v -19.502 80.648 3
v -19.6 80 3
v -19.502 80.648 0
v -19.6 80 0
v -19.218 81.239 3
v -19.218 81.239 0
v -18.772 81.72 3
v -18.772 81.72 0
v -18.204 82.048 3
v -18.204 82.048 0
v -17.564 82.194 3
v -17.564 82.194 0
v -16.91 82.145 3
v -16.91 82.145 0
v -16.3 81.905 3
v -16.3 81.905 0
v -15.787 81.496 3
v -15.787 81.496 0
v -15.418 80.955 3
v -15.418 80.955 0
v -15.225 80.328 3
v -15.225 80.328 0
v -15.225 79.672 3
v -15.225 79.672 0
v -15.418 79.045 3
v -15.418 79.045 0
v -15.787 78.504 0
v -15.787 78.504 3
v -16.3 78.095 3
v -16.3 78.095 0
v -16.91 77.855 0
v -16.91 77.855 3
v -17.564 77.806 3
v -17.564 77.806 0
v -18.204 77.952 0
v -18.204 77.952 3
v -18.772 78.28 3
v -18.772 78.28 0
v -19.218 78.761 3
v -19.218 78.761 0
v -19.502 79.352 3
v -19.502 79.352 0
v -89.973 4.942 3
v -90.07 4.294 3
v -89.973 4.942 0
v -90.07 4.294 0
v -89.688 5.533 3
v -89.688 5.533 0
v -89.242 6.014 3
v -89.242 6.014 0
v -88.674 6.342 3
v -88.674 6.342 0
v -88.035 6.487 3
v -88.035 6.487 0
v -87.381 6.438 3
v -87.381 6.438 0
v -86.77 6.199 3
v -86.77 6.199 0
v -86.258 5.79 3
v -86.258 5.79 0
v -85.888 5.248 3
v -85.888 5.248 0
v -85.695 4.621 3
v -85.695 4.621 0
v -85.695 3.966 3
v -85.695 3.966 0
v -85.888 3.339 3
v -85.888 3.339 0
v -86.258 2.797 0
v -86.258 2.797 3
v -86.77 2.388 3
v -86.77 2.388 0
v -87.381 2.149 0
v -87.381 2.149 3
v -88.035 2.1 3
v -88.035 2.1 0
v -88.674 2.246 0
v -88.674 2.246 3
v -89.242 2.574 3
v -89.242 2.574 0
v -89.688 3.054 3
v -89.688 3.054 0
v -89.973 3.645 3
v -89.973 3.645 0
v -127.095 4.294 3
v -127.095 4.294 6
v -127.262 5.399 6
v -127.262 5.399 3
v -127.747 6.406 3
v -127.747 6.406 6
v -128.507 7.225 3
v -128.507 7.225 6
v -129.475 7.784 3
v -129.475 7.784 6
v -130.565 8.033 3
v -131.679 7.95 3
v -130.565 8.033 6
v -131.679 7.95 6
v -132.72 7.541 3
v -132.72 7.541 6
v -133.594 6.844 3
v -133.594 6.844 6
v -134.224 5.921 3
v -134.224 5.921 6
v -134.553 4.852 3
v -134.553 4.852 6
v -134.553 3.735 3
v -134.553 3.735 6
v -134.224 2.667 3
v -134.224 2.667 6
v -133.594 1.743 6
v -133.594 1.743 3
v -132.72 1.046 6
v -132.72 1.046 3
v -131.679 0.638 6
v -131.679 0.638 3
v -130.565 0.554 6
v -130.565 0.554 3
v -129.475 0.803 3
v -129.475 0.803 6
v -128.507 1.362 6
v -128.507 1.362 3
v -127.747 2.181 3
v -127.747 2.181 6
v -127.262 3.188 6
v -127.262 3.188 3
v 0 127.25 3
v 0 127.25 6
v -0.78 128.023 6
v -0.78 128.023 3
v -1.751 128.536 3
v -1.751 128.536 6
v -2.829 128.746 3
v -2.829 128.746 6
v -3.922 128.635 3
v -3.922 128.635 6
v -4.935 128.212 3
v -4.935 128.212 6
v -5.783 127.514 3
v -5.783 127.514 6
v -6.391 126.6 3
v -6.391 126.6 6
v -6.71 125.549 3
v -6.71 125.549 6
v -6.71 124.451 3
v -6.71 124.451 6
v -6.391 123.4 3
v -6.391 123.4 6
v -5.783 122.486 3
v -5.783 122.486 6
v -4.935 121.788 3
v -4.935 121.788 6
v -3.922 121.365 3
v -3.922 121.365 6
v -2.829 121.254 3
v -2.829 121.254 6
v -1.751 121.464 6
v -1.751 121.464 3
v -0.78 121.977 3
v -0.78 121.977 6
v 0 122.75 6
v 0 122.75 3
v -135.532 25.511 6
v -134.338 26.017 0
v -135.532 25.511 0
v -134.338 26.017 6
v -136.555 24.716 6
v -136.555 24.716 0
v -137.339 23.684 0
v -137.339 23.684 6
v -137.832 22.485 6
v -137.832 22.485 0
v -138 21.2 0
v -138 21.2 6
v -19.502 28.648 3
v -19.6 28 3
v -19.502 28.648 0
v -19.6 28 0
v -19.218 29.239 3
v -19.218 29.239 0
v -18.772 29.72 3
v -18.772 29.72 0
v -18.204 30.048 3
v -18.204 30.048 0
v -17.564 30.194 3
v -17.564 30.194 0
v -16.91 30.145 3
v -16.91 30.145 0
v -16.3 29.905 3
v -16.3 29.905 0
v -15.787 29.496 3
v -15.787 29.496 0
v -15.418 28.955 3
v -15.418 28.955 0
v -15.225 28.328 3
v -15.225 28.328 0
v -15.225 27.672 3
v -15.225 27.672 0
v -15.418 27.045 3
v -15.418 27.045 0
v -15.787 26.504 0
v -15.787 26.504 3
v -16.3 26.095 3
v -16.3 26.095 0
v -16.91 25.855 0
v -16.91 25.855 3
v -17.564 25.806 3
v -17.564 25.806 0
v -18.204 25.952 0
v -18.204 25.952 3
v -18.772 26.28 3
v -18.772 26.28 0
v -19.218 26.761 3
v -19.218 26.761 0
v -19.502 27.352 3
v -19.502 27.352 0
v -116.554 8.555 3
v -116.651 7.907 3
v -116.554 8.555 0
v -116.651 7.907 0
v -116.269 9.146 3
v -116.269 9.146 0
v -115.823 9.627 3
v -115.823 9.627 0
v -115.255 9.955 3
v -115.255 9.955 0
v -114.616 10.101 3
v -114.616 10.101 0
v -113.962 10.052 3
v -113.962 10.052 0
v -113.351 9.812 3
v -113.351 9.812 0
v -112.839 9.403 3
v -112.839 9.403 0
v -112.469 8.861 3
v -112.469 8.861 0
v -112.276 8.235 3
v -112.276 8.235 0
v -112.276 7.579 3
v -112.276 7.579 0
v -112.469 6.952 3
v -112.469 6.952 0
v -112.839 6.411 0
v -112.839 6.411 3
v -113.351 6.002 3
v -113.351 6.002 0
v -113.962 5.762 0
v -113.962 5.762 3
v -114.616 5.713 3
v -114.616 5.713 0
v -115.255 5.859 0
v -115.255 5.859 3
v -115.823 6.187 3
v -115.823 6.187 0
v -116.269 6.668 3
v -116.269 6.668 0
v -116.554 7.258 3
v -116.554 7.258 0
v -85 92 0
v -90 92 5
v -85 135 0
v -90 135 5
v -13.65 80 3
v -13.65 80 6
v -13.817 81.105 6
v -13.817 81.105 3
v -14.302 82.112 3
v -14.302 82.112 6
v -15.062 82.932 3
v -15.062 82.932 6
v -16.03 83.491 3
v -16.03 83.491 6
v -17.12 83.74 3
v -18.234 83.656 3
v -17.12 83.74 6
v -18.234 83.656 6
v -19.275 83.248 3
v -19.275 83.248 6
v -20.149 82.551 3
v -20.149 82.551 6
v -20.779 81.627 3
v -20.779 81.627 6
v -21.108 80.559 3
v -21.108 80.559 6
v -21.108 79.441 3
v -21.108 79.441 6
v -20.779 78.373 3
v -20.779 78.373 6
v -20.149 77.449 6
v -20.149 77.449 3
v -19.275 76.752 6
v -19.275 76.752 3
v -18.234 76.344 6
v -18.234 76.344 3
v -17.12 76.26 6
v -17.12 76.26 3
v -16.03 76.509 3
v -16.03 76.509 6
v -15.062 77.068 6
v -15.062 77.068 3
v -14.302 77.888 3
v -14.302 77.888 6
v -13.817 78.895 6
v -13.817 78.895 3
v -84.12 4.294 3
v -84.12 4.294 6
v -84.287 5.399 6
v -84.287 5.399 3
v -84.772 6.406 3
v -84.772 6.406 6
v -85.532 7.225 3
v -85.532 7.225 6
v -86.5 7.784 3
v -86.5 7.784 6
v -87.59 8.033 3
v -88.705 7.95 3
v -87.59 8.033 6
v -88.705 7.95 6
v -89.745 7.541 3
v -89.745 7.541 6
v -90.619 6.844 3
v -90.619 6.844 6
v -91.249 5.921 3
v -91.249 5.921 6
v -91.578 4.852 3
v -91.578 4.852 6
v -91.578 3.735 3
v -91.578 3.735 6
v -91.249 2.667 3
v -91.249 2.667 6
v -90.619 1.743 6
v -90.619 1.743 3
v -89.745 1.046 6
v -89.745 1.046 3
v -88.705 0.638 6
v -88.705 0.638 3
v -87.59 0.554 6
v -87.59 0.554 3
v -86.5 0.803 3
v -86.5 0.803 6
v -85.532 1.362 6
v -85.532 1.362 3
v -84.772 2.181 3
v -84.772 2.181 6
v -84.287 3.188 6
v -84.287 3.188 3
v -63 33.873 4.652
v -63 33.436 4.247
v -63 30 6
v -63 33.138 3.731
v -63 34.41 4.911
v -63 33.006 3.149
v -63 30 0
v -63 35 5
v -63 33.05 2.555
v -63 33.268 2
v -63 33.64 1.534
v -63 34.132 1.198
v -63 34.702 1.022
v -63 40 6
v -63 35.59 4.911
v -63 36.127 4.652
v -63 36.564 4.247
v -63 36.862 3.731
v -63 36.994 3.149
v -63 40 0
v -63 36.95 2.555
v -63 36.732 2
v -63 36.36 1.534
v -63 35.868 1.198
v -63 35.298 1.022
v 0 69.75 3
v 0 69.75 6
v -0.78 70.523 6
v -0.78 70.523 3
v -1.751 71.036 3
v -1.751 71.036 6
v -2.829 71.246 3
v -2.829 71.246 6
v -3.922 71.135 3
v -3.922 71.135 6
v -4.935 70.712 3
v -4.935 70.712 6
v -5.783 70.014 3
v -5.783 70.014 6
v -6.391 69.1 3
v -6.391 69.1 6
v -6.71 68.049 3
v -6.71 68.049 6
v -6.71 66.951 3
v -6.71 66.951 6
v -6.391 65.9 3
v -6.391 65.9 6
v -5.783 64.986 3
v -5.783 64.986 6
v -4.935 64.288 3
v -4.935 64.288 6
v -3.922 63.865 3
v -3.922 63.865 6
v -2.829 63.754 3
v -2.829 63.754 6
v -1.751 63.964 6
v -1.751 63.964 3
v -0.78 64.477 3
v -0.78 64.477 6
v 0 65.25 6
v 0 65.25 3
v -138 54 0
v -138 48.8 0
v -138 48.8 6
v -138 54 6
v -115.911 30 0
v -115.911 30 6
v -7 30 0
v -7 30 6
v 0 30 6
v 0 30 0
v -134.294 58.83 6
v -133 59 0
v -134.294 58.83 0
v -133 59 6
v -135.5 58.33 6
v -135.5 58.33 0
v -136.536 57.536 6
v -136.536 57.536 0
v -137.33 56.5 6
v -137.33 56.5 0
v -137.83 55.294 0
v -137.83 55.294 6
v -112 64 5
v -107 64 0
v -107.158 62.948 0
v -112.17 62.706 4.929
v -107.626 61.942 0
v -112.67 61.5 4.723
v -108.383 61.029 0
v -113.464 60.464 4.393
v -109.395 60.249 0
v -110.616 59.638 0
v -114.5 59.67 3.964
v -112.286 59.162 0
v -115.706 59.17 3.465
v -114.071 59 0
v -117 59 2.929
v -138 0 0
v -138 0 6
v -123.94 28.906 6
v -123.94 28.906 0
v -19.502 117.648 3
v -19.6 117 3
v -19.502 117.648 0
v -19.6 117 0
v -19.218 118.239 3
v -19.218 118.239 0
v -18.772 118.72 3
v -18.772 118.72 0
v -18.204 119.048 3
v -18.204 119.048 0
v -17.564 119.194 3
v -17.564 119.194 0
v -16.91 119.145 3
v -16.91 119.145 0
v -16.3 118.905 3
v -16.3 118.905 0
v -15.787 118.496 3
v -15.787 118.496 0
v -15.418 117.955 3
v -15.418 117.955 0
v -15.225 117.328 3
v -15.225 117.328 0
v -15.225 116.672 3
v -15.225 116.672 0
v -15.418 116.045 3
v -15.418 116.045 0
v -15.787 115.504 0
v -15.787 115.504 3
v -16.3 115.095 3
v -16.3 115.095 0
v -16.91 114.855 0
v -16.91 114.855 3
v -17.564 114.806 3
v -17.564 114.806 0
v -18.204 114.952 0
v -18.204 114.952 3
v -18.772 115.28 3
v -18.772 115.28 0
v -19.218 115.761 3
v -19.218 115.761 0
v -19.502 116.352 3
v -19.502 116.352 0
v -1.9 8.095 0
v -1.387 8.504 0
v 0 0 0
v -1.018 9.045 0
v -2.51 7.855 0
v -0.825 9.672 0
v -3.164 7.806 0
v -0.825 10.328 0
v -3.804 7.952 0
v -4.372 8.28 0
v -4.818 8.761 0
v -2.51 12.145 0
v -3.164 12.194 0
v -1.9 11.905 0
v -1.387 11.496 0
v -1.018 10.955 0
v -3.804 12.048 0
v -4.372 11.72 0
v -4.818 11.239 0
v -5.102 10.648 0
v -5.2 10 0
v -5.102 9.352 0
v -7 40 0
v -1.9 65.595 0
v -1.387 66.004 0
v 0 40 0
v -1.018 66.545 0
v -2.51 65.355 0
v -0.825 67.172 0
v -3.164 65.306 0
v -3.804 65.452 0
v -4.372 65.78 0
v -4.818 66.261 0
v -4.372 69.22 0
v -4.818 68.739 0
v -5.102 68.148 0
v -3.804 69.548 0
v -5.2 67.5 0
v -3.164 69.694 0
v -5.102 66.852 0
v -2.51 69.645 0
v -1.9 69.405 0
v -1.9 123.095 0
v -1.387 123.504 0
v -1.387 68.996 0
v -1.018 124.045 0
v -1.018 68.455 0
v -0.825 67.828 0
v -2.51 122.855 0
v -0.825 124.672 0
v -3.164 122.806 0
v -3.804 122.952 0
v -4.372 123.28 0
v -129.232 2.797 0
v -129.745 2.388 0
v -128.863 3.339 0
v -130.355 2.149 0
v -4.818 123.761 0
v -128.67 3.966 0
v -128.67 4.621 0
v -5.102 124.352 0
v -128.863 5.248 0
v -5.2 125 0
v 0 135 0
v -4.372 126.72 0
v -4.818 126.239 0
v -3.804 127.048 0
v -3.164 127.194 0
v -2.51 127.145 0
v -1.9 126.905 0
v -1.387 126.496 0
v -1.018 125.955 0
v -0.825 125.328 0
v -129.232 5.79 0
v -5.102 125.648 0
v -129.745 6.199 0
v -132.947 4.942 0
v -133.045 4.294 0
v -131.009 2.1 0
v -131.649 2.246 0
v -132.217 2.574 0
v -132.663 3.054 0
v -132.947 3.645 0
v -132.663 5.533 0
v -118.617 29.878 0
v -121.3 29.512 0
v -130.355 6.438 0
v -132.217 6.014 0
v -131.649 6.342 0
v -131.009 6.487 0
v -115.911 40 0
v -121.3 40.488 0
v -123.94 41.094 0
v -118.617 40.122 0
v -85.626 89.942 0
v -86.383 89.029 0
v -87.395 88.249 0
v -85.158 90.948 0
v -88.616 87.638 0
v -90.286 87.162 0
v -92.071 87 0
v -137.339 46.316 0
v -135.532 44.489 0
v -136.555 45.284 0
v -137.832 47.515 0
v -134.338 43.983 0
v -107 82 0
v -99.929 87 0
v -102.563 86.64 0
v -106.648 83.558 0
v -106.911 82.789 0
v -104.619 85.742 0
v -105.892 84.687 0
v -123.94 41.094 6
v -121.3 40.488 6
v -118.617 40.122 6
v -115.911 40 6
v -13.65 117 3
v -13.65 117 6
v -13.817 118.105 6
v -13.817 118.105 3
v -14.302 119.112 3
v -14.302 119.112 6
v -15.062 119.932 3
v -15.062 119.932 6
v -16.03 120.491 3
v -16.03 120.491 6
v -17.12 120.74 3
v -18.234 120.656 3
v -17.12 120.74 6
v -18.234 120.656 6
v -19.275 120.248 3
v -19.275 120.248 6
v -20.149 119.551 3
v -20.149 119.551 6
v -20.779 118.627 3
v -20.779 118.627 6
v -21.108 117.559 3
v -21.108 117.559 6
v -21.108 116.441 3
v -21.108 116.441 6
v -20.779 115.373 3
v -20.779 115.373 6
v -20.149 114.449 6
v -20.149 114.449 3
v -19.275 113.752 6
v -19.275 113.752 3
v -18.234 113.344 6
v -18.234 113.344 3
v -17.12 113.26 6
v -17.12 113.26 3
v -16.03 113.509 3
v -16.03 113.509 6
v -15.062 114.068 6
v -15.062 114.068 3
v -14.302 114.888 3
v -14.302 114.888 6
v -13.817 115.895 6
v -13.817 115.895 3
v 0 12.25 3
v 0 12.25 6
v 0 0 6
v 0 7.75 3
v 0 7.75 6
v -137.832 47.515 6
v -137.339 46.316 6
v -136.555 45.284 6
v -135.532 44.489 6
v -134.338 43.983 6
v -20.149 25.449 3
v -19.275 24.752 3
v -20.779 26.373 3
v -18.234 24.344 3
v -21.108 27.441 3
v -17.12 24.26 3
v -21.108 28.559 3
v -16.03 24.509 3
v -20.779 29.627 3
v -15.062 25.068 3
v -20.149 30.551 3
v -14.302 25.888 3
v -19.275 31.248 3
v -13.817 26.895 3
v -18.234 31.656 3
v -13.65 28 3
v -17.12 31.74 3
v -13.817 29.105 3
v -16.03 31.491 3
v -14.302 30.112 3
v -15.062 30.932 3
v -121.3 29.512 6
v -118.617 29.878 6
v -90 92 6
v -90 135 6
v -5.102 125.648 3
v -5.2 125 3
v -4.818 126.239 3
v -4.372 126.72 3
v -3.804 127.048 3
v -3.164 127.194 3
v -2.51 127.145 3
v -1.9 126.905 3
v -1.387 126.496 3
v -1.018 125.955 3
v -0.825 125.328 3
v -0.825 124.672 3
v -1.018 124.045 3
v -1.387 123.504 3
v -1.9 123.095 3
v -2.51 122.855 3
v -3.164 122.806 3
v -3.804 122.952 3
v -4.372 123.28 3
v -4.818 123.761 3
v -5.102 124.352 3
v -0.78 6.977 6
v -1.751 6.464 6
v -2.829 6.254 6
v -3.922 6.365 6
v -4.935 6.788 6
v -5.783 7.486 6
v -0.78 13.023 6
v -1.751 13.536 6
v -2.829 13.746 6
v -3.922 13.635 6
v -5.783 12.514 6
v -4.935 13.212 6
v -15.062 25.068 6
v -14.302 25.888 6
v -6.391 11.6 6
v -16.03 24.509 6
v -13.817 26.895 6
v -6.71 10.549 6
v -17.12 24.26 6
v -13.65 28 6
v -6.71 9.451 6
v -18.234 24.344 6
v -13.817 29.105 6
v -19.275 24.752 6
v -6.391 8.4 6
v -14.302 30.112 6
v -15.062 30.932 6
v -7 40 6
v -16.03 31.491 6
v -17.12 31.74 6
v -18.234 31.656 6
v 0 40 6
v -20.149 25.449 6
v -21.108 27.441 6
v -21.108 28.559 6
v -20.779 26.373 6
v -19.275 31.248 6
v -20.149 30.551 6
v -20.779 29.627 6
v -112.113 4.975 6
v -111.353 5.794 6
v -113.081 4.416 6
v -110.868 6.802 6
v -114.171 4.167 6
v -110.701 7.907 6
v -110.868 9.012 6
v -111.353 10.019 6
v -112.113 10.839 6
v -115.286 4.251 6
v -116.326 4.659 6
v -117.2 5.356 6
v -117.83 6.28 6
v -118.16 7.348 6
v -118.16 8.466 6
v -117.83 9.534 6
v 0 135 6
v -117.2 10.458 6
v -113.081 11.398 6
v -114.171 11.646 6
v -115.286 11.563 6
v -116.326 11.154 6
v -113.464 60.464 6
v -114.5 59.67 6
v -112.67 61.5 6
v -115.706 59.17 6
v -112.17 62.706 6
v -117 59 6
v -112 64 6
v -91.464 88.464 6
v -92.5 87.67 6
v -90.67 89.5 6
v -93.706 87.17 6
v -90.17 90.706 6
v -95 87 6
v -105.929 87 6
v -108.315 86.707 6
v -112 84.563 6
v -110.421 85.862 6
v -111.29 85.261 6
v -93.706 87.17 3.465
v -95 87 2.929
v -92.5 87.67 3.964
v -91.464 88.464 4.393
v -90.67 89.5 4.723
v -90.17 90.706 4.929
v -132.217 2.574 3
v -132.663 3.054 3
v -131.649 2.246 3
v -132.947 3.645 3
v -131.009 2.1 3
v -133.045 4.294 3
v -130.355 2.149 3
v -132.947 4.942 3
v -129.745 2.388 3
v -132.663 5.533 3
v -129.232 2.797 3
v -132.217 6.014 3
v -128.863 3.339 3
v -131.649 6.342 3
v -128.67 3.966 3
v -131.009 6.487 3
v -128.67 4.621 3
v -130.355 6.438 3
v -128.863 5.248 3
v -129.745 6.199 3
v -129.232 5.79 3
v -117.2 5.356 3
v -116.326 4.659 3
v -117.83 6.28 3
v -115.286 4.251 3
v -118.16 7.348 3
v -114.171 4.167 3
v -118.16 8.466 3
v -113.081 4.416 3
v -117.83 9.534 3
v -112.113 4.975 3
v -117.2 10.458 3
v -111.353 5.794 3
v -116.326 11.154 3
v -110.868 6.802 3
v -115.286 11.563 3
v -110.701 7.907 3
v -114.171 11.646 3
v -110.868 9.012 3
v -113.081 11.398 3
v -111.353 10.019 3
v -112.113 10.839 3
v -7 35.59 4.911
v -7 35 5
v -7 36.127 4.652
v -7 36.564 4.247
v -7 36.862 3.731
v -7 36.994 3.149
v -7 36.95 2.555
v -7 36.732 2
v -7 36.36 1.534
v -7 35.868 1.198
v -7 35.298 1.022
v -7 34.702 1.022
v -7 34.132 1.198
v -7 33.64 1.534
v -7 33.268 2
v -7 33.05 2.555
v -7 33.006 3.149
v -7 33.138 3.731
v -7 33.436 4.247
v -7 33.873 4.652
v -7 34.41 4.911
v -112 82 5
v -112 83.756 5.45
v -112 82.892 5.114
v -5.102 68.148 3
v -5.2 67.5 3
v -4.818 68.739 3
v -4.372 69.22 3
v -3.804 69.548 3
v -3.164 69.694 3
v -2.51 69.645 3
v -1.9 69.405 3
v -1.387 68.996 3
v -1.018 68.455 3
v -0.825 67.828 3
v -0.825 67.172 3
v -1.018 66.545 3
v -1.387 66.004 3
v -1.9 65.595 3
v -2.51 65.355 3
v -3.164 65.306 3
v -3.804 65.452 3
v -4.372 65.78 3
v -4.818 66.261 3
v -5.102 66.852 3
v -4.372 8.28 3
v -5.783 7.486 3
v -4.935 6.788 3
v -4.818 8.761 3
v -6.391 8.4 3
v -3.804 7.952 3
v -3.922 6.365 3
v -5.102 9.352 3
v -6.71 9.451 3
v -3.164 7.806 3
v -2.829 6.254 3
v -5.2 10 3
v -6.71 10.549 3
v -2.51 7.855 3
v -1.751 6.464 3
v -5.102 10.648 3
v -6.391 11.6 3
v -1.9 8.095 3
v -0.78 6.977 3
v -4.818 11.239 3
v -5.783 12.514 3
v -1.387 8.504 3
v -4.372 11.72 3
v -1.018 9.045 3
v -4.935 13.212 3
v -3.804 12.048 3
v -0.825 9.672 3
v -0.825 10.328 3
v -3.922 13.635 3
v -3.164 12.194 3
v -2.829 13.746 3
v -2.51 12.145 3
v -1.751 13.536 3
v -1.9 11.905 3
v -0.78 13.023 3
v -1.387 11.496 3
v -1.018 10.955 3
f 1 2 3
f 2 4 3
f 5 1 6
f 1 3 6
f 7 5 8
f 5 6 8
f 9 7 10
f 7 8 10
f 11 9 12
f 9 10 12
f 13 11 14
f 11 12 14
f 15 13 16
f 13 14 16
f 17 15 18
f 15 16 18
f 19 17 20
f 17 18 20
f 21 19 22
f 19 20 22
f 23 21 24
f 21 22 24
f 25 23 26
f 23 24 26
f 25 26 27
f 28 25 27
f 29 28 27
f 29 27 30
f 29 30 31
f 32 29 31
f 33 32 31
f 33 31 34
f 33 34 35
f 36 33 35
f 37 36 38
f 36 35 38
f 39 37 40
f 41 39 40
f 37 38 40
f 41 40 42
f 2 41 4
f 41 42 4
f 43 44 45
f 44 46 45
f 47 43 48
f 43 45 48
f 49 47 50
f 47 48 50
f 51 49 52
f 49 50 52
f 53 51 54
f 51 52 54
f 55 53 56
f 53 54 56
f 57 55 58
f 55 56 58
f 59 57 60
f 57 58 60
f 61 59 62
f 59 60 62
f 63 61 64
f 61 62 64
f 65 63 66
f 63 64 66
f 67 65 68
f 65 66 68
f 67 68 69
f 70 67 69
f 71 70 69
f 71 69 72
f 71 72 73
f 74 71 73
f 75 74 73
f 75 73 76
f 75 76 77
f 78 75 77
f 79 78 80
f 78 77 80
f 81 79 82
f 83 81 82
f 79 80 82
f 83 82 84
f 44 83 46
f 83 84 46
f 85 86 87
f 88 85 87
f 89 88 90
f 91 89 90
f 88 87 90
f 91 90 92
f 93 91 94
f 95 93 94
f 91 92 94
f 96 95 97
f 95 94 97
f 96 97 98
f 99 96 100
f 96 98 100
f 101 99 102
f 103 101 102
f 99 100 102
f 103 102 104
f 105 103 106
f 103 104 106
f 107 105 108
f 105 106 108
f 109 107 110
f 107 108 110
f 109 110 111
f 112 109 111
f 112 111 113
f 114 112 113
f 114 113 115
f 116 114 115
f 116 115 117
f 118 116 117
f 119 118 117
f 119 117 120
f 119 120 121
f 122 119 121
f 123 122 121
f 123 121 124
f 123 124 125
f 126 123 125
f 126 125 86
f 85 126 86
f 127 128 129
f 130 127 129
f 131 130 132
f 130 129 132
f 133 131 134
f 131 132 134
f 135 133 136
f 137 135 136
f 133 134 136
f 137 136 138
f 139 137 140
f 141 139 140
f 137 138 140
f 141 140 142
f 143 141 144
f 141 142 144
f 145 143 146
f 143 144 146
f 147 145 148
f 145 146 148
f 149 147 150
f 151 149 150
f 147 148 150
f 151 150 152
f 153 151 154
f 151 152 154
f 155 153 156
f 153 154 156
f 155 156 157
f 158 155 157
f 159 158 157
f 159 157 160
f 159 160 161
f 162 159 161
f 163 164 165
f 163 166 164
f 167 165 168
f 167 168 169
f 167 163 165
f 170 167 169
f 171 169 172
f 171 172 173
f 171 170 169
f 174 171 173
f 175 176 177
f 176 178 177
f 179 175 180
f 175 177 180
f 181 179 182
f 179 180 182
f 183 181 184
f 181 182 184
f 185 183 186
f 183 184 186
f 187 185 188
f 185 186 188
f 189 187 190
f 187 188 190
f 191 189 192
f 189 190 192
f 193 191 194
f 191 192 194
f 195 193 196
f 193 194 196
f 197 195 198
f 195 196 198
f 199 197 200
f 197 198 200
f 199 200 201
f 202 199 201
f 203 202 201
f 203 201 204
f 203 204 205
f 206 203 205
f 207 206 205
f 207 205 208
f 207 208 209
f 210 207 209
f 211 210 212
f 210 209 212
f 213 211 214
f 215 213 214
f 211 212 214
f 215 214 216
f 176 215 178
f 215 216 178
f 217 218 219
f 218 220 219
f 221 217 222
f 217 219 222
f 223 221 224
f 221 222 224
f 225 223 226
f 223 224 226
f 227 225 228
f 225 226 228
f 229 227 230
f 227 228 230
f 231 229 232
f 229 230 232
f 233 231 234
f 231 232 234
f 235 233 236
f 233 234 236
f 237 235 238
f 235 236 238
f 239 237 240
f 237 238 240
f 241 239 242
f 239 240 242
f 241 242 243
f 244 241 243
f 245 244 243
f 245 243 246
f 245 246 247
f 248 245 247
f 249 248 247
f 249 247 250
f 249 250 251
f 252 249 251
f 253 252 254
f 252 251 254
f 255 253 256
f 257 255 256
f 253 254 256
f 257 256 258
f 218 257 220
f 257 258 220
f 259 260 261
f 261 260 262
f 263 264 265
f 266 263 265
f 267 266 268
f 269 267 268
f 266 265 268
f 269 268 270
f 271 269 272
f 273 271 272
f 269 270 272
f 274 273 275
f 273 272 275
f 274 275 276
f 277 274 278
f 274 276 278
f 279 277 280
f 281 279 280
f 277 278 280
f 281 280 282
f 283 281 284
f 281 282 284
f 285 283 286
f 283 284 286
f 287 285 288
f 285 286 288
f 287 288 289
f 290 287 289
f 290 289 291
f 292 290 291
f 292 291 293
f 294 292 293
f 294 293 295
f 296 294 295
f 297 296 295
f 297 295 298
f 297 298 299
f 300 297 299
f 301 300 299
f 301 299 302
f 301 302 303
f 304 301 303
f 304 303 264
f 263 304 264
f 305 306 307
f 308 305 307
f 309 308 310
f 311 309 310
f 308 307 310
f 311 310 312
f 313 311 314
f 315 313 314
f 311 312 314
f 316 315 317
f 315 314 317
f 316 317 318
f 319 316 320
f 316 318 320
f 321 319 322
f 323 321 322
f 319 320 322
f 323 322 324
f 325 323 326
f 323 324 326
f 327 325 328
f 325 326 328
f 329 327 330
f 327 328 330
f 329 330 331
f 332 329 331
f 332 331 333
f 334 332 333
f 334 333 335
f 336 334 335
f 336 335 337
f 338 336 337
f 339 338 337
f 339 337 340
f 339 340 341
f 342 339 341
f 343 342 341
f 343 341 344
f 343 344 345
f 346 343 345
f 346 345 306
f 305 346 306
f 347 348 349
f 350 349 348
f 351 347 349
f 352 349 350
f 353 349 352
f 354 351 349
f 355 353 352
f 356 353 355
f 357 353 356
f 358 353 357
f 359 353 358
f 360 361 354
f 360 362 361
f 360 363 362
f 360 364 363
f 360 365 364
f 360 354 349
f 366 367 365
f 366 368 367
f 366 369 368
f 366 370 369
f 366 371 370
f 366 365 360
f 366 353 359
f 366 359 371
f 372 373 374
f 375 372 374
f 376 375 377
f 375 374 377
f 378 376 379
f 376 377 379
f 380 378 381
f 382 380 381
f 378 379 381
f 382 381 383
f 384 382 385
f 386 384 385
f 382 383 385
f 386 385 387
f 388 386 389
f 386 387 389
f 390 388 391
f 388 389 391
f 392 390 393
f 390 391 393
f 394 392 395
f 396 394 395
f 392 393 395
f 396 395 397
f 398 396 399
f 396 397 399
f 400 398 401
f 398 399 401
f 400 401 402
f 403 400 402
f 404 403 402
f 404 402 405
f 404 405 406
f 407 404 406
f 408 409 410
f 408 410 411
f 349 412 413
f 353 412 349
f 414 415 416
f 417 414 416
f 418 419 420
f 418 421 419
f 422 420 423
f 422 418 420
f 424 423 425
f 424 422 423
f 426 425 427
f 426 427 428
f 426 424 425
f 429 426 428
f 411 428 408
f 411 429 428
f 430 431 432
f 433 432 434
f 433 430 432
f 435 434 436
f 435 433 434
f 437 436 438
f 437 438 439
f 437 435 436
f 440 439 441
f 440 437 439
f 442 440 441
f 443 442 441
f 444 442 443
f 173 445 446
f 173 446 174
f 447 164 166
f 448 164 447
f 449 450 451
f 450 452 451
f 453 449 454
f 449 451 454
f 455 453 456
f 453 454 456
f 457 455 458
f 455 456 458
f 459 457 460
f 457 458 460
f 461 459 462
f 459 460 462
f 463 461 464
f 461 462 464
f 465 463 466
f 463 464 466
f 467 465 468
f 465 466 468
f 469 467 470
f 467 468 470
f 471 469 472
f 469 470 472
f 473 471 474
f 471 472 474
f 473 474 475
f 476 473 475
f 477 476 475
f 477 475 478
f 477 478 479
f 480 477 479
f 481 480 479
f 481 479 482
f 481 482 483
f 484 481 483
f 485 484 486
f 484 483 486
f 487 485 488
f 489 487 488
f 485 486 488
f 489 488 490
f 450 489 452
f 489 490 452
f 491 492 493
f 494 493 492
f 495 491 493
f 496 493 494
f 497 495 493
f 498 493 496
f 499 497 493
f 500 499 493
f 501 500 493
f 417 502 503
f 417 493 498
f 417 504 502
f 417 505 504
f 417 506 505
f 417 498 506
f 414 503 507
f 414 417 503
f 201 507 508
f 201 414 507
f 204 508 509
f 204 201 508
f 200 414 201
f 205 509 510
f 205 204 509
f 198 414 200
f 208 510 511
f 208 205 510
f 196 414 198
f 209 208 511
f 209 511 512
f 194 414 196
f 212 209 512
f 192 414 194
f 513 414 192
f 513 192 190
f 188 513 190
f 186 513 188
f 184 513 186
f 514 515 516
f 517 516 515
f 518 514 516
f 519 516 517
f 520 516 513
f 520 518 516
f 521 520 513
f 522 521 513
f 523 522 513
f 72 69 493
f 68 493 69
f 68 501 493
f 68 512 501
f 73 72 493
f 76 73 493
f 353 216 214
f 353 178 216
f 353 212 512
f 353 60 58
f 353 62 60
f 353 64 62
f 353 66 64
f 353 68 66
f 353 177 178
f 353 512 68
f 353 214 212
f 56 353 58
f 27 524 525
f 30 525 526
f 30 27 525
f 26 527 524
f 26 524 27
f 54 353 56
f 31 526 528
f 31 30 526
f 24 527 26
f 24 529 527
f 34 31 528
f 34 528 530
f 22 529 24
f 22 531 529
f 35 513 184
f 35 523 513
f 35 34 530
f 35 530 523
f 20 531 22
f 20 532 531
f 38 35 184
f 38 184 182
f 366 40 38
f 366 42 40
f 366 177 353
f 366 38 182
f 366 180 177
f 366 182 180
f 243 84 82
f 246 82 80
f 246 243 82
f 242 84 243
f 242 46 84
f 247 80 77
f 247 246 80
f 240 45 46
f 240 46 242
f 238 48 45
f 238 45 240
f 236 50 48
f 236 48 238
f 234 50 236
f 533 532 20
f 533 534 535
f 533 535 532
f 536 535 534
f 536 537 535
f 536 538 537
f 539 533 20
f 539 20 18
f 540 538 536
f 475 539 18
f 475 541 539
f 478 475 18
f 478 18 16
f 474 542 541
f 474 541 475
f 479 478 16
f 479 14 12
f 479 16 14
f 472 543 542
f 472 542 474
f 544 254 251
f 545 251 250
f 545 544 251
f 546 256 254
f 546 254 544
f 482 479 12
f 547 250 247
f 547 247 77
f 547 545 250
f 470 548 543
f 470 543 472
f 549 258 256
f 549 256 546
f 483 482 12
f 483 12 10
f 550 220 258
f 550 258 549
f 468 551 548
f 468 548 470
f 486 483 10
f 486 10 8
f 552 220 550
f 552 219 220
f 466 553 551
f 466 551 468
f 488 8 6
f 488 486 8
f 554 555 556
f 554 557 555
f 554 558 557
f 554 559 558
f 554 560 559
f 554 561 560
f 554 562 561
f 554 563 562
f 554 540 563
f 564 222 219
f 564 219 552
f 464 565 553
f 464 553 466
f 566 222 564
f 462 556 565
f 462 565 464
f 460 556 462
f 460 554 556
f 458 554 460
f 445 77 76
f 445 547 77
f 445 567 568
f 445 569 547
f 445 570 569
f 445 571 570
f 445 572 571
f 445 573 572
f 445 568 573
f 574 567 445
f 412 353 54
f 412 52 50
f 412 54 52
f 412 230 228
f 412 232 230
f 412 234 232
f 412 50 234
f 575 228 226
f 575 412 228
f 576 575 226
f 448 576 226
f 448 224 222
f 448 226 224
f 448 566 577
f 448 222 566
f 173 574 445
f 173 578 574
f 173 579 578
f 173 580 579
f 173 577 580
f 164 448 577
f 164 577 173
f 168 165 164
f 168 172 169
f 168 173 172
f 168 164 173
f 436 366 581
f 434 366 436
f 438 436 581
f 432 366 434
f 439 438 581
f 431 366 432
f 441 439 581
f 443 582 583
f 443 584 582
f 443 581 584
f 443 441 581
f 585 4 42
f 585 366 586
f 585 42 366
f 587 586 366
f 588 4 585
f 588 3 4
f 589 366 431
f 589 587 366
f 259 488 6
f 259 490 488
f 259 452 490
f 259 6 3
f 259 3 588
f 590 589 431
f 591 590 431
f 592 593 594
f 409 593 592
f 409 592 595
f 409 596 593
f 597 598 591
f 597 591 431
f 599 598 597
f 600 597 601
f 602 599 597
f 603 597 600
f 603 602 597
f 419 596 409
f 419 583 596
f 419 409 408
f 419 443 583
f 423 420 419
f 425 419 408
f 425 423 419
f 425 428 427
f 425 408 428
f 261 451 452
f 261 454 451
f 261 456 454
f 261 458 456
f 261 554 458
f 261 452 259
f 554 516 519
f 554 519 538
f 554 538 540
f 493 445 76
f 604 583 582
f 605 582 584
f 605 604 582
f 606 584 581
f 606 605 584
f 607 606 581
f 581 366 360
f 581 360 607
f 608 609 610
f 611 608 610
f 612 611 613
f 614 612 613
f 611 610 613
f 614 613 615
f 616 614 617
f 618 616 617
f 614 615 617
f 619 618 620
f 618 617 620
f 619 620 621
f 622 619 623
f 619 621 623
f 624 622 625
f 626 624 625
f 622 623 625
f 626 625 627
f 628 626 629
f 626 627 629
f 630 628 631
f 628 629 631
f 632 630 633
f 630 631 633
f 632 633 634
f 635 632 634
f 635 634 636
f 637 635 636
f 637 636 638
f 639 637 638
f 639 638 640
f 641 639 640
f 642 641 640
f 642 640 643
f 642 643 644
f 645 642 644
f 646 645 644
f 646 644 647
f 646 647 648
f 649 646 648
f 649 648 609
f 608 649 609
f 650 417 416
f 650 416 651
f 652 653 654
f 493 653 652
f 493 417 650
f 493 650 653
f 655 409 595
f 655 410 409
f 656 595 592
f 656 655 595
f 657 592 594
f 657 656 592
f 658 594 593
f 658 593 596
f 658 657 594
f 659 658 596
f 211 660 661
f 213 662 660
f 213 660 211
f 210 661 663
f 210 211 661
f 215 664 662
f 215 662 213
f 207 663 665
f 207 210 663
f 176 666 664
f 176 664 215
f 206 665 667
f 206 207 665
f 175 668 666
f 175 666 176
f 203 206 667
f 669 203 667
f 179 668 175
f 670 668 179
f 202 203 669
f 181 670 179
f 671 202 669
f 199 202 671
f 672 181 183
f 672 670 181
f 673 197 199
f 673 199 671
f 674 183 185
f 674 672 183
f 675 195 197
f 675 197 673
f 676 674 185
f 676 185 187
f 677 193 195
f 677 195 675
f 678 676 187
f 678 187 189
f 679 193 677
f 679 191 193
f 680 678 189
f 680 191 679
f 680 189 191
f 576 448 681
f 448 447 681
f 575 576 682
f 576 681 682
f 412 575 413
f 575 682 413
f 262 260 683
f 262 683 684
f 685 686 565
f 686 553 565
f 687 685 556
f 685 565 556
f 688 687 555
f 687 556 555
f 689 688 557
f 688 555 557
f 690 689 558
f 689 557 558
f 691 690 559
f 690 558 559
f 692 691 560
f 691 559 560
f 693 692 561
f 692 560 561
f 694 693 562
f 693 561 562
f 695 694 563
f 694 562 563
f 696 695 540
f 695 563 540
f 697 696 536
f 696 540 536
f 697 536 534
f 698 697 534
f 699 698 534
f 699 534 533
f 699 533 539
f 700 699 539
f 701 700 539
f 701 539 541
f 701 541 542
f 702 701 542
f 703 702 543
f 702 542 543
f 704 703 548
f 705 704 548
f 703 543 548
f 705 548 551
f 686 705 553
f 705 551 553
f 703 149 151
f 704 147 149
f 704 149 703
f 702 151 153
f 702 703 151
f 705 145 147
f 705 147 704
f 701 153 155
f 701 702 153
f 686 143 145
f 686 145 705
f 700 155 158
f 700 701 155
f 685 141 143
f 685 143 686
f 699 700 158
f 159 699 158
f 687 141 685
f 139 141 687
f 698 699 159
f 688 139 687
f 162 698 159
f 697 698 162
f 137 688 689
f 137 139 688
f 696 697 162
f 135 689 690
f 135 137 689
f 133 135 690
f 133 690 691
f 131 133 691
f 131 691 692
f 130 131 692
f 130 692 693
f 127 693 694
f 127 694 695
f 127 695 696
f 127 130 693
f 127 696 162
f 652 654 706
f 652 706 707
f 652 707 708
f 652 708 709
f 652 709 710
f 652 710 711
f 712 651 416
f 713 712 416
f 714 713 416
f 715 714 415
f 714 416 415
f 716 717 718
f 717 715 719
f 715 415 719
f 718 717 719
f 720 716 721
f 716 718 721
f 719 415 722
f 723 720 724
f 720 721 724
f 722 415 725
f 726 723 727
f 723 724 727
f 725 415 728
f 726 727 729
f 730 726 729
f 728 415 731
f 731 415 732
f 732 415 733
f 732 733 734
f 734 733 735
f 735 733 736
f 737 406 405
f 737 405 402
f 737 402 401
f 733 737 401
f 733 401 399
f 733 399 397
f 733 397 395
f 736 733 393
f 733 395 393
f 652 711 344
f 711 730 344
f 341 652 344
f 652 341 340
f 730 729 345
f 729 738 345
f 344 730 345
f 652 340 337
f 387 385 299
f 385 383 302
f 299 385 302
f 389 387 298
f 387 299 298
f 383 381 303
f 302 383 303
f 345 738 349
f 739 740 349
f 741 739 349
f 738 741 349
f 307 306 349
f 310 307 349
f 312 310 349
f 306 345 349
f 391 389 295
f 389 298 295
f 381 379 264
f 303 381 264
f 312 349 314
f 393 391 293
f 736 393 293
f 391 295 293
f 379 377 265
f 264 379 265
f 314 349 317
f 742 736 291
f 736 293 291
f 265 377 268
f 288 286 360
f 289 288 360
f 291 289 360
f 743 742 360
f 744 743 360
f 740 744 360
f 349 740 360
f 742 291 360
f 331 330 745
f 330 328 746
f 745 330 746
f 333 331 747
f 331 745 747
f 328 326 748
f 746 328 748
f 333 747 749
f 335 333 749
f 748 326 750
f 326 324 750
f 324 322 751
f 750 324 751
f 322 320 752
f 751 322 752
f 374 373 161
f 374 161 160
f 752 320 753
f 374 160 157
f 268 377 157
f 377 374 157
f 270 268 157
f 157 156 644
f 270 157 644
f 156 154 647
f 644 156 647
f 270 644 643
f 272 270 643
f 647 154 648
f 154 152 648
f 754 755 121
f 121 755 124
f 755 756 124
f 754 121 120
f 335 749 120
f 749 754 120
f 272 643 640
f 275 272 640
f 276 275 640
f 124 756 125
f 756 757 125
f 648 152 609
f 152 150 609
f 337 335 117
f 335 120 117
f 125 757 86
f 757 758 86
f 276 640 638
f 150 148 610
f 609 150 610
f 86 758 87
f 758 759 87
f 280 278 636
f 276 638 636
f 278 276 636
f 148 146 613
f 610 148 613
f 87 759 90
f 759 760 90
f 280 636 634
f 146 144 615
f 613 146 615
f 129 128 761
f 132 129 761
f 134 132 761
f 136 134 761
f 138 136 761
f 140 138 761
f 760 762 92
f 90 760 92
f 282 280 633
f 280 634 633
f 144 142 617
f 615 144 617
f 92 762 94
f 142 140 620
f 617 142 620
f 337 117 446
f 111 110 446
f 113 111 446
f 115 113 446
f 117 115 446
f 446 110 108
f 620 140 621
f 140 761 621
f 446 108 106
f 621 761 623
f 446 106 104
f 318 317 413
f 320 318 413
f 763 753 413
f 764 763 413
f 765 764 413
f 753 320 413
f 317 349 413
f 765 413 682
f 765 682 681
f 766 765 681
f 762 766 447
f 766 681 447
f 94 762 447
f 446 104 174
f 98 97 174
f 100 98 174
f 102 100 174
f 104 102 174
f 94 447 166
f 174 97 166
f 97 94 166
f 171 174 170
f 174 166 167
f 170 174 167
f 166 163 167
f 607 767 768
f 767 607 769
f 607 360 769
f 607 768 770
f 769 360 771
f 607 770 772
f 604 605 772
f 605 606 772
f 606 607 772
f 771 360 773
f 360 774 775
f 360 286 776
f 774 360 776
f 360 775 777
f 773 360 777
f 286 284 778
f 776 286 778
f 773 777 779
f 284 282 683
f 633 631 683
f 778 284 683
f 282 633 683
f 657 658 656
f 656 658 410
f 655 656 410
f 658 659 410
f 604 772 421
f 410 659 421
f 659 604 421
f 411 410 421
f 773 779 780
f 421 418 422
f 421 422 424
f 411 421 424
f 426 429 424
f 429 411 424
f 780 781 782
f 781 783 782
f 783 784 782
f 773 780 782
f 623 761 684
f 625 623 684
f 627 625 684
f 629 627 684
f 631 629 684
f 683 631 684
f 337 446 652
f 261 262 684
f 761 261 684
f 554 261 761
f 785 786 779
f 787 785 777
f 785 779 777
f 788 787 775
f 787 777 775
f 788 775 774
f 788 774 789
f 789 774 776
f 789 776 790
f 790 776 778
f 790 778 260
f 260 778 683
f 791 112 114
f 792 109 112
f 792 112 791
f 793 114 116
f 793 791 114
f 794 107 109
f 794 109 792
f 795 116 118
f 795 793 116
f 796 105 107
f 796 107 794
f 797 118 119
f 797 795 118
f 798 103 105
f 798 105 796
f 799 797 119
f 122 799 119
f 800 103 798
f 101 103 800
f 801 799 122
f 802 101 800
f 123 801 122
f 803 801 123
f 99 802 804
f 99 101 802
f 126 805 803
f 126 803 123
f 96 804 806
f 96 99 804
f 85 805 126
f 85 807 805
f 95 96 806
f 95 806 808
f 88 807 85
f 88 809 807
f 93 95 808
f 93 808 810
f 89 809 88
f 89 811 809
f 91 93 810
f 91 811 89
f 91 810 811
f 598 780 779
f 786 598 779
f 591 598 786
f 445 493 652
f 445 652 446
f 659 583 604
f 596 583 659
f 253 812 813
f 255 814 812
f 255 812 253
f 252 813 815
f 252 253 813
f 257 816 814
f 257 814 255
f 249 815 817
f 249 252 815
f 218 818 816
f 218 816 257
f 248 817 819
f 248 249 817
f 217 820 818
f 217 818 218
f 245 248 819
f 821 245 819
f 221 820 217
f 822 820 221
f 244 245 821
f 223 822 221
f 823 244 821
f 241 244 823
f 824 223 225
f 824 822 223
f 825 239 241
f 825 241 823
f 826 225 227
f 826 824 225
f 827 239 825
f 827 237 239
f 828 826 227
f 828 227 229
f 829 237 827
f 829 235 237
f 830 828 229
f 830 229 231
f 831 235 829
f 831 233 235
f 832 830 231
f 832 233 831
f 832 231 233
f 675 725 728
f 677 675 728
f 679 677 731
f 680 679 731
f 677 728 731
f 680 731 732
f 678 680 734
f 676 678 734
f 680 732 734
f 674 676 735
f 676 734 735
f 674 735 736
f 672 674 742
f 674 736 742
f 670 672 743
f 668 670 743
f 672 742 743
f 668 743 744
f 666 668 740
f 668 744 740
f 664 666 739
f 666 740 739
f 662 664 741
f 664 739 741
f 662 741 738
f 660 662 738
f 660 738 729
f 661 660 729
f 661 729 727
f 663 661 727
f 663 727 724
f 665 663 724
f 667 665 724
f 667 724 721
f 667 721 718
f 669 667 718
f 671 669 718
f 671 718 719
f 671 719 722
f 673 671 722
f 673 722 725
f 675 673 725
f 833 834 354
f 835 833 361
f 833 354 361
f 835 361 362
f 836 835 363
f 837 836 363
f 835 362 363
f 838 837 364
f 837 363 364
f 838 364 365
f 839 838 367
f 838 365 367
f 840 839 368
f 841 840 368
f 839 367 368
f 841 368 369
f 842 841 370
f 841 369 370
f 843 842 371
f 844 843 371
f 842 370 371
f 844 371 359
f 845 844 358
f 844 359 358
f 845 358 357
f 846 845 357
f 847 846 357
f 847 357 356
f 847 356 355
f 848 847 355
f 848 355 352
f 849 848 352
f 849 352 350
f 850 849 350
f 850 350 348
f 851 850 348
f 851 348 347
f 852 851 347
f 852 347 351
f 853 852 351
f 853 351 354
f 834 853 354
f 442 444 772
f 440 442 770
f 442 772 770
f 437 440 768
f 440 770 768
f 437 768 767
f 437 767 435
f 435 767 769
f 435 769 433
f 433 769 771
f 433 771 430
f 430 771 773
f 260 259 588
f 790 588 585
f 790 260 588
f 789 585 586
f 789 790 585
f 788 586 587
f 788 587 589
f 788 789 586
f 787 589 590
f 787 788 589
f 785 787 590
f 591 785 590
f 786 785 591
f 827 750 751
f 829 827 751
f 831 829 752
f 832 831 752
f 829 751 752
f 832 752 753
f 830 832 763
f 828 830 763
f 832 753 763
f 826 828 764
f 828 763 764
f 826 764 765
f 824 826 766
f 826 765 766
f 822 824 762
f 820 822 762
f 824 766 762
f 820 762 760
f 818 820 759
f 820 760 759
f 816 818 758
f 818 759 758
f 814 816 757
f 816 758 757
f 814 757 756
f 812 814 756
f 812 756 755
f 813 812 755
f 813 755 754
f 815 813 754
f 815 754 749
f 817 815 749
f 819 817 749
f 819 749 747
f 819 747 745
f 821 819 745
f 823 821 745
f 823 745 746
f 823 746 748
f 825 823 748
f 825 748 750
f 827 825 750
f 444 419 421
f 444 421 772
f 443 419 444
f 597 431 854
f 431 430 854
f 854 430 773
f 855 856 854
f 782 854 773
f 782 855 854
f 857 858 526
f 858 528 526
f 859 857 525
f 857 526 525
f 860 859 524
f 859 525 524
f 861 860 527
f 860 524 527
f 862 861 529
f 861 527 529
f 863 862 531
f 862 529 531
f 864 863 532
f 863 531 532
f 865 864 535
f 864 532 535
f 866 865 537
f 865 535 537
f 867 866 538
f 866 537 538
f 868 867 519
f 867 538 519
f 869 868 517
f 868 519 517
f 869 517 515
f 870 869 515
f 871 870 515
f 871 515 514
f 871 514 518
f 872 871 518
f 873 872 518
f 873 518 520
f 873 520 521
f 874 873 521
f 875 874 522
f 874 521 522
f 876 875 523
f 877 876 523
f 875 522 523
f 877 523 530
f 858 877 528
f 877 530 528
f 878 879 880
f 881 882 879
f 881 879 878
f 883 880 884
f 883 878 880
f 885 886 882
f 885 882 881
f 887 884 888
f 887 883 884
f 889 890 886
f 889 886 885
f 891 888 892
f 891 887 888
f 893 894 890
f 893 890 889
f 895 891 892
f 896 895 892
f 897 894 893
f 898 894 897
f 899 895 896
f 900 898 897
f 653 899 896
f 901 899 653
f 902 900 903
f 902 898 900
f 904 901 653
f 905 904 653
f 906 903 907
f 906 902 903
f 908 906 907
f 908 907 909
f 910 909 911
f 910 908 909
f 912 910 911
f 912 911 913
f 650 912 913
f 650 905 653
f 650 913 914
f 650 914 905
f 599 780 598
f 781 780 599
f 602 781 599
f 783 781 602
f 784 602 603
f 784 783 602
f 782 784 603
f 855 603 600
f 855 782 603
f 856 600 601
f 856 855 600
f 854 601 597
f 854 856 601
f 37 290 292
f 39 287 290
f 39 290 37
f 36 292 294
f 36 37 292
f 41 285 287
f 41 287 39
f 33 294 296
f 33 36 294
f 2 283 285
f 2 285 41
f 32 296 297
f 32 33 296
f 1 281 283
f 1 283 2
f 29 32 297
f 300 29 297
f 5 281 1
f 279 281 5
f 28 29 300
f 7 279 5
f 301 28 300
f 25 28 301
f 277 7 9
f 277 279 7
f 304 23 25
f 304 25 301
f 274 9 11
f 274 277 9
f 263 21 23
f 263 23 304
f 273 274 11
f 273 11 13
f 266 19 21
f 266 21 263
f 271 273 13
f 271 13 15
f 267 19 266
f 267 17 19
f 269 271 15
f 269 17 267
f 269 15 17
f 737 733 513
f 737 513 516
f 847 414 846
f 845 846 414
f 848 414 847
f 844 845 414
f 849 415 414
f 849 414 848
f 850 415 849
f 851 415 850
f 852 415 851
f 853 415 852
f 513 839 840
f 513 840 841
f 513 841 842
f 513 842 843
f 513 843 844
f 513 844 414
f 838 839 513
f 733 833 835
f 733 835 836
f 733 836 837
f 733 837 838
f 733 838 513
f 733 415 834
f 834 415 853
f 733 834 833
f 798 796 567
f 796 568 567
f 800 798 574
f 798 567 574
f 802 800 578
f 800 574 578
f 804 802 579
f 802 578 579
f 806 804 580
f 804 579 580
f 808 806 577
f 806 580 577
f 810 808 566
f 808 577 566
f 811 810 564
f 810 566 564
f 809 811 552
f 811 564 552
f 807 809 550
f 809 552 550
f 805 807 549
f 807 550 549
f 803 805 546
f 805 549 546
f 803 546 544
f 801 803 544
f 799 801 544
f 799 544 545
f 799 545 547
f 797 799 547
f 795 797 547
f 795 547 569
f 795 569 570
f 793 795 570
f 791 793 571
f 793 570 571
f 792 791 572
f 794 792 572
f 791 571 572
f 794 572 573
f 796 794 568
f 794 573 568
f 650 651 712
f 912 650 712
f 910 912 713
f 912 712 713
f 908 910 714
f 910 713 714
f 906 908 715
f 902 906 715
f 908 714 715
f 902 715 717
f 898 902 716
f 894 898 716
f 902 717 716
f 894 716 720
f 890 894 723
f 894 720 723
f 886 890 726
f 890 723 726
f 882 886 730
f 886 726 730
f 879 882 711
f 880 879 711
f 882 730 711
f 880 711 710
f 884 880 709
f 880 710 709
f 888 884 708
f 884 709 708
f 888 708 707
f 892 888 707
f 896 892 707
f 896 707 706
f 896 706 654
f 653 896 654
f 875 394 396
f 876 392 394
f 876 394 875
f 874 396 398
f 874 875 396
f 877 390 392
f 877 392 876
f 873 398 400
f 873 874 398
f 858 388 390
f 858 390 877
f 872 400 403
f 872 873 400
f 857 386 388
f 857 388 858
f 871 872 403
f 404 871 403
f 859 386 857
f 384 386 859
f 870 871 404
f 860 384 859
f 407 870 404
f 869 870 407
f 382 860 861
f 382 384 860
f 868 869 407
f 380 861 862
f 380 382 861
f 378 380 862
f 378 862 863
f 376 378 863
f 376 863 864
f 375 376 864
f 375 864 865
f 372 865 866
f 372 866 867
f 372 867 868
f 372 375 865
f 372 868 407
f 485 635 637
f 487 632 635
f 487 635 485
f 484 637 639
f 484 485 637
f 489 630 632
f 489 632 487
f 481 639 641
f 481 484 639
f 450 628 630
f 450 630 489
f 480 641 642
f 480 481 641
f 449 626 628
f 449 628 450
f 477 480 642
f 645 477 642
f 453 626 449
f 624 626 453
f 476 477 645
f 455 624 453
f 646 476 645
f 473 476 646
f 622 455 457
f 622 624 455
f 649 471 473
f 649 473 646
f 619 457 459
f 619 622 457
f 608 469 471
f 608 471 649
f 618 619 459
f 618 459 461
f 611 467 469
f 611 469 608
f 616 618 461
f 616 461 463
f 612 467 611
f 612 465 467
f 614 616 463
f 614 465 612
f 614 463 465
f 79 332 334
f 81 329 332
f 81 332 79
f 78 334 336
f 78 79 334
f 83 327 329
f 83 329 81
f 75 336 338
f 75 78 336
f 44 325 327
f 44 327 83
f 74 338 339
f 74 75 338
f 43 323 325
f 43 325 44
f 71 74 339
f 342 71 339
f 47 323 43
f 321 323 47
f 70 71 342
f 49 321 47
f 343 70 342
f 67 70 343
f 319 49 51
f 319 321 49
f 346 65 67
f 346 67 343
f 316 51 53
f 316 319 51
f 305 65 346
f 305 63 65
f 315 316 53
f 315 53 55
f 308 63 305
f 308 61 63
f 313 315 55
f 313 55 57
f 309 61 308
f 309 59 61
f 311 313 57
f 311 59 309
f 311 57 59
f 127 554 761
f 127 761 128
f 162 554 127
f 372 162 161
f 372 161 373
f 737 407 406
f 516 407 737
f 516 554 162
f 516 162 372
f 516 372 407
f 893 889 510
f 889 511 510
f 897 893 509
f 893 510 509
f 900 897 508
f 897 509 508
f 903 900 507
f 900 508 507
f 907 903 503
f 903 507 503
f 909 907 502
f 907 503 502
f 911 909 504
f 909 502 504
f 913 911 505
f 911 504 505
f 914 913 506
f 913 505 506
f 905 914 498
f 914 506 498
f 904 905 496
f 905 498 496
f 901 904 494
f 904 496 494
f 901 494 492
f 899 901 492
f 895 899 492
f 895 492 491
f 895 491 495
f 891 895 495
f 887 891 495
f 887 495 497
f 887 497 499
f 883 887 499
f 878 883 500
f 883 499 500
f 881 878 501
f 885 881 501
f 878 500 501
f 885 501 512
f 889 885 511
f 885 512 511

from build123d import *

# Parameters (mm, degrees)
BOSS_EXTRUDE1_DEPTH = 6
CUT_EXTRUDE1_DEPTH  = 194.145023234
SKETCH5_R           = 2
CUT_EXTRUDE2_DEPTH  = 155.550962469
FILLET1_R           = 30
CHAMFER1_SIZE       = 5
FILLET2_R           = 5
SKETCH6_W           = 7
SKETCH6_H           = 10
CUT_EXTRUDE3_DEPTH  = 194.145023234
HOLE1_D             = 4.4
HOLE1_CBORE_D       = 7.5
HOLE1_CBORE_DEPTH   = 3
HOLE2_D             = 4.4
HOLE2_CBORE_D       = 7.5
HOLE2_CBORE_DEPTH   = 3
FILLET3_R           = 5
FILLET5_R           = 5
HOLE3_D             = 4.4
HOLE3_CBORE_D       = 7.5
HOLE3_CBORE_DEPTH   = 3


with BuildPart() as part:
    # Sketch1 → Boss-Extrude1 (new body)
    with BuildSketch(Plane.XY):
        Polygon((0, 0), (-138, 0), (-138, 30), (-63, 30), (-63, 40), (-138, 40), (-138, 59), (-112, 59), (-112, 87), (-90, 87), (-90, 135), (0, 135), align=None)
    extrude(amount=BOSS_EXTRUDE1_DEPTH)

    # Sketch4 → Cut-Extrude1 (cut, through all)
    with BuildSketch(Plane(origin=(0, 0, 0), x_dir=(-1, 0, 0), z_dir=(0, 0, -1))):
        Polygon((120, 40), (138, 45), (138, 40), align=None)
        Polygon((120, 30), (138, 30), (138, 25), align=None)
    extrude(amount=-CUT_EXTRUDE1_DEPTH, mode=Mode.SUBTRACT)

    # Sketch5 → Cut-Extrude2 (cut, through all)
    with BuildSketch(Plane.ZY.offset(63)):
        with Locations((3, 35)):
            Circle(SKETCH5_R)
    extrude(amount=-CUT_EXTRUDE2_DEPTH, mode=Mode.SUBTRACT)

    # Fillet1
    fillet1_edges = [part.edges().sort_by_distance(p)[0] for p in [
        (-120, 40, 3),
        (-120, 30, 3),
    ]]
    fillet(fillet1_edges, radius=FILLET1_R)

    # Chamfer1
    chamfer1_edges = [part.edges().sort_by_distance(p)[0] for p in [
        (-112, 73, 0),
        (-90, 111, 0),
    ]]
    chamfer(chamfer1_edges, length=CHAMFER1_SIZE)

    # Fillet2
    fillet2_edges = [part.edges().sort_by_distance(p)[0] for p in [
        (-138, 59, 3),
        (-138, 45, 3),
        (-138, 25, 3),
    ]]
    fillet(fillet2_edges, radius=FILLET2_R)

    # Sketch6 → Cut-Extrude3 (cut, through all)
    with BuildSketch(Plane.XY.offset(6)):
        with Locations((-3.5, 35)):
            Rectangle(SKETCH6_W, SKETCH6_H)
    extrude(amount=-CUT_EXTRUDE3_DEPTH, mode=Mode.SUBTRACT)

    # Hole1 (through all)
    with Locations(Plane.XY.offset(6)):
        with Locations((-17.4, 117), (-17.4, 80), (-17.4, 28)):
            CounterBoreHole(HOLE1_D / 2, HOLE1_CBORE_D / 2, HOLE1_CBORE_DEPTH)

    # Hole2 (through all)
    with Locations(Plane.XY.offset(6)):
        with Locations((-3, 125), (-3, 67.5), (-3, 10)):
            CounterBoreHole(HOLE2_D / 2, HOLE2_CBORE_D / 2, HOLE2_CBORE_DEPTH)

    # Fillet3
    fillet3_edges = [part.edges().sort_by_distance(p)[0] for p in [
        (-112, 59, 5.5),
        (-90, 87, 5.5),
        (-109.5, 59, 2.5),
        (-87.5, 87, 2.5),
    ]]
    fillet(fillet3_edges, radius=FILLET3_R)

    # Fillet5
    fillet5_edges = [part.edges().sort_by_distance(p)[0] for p in [
        (-109.5, 87, 2.5),
    ]]
    fillet(fillet5_edges, radius=FILLET5_R)

    # Hole3 (through all)
    with Locations(Plane.XY.offset(6)):
        with Locations((-130.844995532, 4.293591352), (-114.451398707, 7.906888356), (-87.870353785, 4.293591352)):
            CounterBoreHole(HOLE3_D / 2, HOLE3_CBORE_D / 2, HOLE3_CBORE_DEPTH)


solid = part.part
